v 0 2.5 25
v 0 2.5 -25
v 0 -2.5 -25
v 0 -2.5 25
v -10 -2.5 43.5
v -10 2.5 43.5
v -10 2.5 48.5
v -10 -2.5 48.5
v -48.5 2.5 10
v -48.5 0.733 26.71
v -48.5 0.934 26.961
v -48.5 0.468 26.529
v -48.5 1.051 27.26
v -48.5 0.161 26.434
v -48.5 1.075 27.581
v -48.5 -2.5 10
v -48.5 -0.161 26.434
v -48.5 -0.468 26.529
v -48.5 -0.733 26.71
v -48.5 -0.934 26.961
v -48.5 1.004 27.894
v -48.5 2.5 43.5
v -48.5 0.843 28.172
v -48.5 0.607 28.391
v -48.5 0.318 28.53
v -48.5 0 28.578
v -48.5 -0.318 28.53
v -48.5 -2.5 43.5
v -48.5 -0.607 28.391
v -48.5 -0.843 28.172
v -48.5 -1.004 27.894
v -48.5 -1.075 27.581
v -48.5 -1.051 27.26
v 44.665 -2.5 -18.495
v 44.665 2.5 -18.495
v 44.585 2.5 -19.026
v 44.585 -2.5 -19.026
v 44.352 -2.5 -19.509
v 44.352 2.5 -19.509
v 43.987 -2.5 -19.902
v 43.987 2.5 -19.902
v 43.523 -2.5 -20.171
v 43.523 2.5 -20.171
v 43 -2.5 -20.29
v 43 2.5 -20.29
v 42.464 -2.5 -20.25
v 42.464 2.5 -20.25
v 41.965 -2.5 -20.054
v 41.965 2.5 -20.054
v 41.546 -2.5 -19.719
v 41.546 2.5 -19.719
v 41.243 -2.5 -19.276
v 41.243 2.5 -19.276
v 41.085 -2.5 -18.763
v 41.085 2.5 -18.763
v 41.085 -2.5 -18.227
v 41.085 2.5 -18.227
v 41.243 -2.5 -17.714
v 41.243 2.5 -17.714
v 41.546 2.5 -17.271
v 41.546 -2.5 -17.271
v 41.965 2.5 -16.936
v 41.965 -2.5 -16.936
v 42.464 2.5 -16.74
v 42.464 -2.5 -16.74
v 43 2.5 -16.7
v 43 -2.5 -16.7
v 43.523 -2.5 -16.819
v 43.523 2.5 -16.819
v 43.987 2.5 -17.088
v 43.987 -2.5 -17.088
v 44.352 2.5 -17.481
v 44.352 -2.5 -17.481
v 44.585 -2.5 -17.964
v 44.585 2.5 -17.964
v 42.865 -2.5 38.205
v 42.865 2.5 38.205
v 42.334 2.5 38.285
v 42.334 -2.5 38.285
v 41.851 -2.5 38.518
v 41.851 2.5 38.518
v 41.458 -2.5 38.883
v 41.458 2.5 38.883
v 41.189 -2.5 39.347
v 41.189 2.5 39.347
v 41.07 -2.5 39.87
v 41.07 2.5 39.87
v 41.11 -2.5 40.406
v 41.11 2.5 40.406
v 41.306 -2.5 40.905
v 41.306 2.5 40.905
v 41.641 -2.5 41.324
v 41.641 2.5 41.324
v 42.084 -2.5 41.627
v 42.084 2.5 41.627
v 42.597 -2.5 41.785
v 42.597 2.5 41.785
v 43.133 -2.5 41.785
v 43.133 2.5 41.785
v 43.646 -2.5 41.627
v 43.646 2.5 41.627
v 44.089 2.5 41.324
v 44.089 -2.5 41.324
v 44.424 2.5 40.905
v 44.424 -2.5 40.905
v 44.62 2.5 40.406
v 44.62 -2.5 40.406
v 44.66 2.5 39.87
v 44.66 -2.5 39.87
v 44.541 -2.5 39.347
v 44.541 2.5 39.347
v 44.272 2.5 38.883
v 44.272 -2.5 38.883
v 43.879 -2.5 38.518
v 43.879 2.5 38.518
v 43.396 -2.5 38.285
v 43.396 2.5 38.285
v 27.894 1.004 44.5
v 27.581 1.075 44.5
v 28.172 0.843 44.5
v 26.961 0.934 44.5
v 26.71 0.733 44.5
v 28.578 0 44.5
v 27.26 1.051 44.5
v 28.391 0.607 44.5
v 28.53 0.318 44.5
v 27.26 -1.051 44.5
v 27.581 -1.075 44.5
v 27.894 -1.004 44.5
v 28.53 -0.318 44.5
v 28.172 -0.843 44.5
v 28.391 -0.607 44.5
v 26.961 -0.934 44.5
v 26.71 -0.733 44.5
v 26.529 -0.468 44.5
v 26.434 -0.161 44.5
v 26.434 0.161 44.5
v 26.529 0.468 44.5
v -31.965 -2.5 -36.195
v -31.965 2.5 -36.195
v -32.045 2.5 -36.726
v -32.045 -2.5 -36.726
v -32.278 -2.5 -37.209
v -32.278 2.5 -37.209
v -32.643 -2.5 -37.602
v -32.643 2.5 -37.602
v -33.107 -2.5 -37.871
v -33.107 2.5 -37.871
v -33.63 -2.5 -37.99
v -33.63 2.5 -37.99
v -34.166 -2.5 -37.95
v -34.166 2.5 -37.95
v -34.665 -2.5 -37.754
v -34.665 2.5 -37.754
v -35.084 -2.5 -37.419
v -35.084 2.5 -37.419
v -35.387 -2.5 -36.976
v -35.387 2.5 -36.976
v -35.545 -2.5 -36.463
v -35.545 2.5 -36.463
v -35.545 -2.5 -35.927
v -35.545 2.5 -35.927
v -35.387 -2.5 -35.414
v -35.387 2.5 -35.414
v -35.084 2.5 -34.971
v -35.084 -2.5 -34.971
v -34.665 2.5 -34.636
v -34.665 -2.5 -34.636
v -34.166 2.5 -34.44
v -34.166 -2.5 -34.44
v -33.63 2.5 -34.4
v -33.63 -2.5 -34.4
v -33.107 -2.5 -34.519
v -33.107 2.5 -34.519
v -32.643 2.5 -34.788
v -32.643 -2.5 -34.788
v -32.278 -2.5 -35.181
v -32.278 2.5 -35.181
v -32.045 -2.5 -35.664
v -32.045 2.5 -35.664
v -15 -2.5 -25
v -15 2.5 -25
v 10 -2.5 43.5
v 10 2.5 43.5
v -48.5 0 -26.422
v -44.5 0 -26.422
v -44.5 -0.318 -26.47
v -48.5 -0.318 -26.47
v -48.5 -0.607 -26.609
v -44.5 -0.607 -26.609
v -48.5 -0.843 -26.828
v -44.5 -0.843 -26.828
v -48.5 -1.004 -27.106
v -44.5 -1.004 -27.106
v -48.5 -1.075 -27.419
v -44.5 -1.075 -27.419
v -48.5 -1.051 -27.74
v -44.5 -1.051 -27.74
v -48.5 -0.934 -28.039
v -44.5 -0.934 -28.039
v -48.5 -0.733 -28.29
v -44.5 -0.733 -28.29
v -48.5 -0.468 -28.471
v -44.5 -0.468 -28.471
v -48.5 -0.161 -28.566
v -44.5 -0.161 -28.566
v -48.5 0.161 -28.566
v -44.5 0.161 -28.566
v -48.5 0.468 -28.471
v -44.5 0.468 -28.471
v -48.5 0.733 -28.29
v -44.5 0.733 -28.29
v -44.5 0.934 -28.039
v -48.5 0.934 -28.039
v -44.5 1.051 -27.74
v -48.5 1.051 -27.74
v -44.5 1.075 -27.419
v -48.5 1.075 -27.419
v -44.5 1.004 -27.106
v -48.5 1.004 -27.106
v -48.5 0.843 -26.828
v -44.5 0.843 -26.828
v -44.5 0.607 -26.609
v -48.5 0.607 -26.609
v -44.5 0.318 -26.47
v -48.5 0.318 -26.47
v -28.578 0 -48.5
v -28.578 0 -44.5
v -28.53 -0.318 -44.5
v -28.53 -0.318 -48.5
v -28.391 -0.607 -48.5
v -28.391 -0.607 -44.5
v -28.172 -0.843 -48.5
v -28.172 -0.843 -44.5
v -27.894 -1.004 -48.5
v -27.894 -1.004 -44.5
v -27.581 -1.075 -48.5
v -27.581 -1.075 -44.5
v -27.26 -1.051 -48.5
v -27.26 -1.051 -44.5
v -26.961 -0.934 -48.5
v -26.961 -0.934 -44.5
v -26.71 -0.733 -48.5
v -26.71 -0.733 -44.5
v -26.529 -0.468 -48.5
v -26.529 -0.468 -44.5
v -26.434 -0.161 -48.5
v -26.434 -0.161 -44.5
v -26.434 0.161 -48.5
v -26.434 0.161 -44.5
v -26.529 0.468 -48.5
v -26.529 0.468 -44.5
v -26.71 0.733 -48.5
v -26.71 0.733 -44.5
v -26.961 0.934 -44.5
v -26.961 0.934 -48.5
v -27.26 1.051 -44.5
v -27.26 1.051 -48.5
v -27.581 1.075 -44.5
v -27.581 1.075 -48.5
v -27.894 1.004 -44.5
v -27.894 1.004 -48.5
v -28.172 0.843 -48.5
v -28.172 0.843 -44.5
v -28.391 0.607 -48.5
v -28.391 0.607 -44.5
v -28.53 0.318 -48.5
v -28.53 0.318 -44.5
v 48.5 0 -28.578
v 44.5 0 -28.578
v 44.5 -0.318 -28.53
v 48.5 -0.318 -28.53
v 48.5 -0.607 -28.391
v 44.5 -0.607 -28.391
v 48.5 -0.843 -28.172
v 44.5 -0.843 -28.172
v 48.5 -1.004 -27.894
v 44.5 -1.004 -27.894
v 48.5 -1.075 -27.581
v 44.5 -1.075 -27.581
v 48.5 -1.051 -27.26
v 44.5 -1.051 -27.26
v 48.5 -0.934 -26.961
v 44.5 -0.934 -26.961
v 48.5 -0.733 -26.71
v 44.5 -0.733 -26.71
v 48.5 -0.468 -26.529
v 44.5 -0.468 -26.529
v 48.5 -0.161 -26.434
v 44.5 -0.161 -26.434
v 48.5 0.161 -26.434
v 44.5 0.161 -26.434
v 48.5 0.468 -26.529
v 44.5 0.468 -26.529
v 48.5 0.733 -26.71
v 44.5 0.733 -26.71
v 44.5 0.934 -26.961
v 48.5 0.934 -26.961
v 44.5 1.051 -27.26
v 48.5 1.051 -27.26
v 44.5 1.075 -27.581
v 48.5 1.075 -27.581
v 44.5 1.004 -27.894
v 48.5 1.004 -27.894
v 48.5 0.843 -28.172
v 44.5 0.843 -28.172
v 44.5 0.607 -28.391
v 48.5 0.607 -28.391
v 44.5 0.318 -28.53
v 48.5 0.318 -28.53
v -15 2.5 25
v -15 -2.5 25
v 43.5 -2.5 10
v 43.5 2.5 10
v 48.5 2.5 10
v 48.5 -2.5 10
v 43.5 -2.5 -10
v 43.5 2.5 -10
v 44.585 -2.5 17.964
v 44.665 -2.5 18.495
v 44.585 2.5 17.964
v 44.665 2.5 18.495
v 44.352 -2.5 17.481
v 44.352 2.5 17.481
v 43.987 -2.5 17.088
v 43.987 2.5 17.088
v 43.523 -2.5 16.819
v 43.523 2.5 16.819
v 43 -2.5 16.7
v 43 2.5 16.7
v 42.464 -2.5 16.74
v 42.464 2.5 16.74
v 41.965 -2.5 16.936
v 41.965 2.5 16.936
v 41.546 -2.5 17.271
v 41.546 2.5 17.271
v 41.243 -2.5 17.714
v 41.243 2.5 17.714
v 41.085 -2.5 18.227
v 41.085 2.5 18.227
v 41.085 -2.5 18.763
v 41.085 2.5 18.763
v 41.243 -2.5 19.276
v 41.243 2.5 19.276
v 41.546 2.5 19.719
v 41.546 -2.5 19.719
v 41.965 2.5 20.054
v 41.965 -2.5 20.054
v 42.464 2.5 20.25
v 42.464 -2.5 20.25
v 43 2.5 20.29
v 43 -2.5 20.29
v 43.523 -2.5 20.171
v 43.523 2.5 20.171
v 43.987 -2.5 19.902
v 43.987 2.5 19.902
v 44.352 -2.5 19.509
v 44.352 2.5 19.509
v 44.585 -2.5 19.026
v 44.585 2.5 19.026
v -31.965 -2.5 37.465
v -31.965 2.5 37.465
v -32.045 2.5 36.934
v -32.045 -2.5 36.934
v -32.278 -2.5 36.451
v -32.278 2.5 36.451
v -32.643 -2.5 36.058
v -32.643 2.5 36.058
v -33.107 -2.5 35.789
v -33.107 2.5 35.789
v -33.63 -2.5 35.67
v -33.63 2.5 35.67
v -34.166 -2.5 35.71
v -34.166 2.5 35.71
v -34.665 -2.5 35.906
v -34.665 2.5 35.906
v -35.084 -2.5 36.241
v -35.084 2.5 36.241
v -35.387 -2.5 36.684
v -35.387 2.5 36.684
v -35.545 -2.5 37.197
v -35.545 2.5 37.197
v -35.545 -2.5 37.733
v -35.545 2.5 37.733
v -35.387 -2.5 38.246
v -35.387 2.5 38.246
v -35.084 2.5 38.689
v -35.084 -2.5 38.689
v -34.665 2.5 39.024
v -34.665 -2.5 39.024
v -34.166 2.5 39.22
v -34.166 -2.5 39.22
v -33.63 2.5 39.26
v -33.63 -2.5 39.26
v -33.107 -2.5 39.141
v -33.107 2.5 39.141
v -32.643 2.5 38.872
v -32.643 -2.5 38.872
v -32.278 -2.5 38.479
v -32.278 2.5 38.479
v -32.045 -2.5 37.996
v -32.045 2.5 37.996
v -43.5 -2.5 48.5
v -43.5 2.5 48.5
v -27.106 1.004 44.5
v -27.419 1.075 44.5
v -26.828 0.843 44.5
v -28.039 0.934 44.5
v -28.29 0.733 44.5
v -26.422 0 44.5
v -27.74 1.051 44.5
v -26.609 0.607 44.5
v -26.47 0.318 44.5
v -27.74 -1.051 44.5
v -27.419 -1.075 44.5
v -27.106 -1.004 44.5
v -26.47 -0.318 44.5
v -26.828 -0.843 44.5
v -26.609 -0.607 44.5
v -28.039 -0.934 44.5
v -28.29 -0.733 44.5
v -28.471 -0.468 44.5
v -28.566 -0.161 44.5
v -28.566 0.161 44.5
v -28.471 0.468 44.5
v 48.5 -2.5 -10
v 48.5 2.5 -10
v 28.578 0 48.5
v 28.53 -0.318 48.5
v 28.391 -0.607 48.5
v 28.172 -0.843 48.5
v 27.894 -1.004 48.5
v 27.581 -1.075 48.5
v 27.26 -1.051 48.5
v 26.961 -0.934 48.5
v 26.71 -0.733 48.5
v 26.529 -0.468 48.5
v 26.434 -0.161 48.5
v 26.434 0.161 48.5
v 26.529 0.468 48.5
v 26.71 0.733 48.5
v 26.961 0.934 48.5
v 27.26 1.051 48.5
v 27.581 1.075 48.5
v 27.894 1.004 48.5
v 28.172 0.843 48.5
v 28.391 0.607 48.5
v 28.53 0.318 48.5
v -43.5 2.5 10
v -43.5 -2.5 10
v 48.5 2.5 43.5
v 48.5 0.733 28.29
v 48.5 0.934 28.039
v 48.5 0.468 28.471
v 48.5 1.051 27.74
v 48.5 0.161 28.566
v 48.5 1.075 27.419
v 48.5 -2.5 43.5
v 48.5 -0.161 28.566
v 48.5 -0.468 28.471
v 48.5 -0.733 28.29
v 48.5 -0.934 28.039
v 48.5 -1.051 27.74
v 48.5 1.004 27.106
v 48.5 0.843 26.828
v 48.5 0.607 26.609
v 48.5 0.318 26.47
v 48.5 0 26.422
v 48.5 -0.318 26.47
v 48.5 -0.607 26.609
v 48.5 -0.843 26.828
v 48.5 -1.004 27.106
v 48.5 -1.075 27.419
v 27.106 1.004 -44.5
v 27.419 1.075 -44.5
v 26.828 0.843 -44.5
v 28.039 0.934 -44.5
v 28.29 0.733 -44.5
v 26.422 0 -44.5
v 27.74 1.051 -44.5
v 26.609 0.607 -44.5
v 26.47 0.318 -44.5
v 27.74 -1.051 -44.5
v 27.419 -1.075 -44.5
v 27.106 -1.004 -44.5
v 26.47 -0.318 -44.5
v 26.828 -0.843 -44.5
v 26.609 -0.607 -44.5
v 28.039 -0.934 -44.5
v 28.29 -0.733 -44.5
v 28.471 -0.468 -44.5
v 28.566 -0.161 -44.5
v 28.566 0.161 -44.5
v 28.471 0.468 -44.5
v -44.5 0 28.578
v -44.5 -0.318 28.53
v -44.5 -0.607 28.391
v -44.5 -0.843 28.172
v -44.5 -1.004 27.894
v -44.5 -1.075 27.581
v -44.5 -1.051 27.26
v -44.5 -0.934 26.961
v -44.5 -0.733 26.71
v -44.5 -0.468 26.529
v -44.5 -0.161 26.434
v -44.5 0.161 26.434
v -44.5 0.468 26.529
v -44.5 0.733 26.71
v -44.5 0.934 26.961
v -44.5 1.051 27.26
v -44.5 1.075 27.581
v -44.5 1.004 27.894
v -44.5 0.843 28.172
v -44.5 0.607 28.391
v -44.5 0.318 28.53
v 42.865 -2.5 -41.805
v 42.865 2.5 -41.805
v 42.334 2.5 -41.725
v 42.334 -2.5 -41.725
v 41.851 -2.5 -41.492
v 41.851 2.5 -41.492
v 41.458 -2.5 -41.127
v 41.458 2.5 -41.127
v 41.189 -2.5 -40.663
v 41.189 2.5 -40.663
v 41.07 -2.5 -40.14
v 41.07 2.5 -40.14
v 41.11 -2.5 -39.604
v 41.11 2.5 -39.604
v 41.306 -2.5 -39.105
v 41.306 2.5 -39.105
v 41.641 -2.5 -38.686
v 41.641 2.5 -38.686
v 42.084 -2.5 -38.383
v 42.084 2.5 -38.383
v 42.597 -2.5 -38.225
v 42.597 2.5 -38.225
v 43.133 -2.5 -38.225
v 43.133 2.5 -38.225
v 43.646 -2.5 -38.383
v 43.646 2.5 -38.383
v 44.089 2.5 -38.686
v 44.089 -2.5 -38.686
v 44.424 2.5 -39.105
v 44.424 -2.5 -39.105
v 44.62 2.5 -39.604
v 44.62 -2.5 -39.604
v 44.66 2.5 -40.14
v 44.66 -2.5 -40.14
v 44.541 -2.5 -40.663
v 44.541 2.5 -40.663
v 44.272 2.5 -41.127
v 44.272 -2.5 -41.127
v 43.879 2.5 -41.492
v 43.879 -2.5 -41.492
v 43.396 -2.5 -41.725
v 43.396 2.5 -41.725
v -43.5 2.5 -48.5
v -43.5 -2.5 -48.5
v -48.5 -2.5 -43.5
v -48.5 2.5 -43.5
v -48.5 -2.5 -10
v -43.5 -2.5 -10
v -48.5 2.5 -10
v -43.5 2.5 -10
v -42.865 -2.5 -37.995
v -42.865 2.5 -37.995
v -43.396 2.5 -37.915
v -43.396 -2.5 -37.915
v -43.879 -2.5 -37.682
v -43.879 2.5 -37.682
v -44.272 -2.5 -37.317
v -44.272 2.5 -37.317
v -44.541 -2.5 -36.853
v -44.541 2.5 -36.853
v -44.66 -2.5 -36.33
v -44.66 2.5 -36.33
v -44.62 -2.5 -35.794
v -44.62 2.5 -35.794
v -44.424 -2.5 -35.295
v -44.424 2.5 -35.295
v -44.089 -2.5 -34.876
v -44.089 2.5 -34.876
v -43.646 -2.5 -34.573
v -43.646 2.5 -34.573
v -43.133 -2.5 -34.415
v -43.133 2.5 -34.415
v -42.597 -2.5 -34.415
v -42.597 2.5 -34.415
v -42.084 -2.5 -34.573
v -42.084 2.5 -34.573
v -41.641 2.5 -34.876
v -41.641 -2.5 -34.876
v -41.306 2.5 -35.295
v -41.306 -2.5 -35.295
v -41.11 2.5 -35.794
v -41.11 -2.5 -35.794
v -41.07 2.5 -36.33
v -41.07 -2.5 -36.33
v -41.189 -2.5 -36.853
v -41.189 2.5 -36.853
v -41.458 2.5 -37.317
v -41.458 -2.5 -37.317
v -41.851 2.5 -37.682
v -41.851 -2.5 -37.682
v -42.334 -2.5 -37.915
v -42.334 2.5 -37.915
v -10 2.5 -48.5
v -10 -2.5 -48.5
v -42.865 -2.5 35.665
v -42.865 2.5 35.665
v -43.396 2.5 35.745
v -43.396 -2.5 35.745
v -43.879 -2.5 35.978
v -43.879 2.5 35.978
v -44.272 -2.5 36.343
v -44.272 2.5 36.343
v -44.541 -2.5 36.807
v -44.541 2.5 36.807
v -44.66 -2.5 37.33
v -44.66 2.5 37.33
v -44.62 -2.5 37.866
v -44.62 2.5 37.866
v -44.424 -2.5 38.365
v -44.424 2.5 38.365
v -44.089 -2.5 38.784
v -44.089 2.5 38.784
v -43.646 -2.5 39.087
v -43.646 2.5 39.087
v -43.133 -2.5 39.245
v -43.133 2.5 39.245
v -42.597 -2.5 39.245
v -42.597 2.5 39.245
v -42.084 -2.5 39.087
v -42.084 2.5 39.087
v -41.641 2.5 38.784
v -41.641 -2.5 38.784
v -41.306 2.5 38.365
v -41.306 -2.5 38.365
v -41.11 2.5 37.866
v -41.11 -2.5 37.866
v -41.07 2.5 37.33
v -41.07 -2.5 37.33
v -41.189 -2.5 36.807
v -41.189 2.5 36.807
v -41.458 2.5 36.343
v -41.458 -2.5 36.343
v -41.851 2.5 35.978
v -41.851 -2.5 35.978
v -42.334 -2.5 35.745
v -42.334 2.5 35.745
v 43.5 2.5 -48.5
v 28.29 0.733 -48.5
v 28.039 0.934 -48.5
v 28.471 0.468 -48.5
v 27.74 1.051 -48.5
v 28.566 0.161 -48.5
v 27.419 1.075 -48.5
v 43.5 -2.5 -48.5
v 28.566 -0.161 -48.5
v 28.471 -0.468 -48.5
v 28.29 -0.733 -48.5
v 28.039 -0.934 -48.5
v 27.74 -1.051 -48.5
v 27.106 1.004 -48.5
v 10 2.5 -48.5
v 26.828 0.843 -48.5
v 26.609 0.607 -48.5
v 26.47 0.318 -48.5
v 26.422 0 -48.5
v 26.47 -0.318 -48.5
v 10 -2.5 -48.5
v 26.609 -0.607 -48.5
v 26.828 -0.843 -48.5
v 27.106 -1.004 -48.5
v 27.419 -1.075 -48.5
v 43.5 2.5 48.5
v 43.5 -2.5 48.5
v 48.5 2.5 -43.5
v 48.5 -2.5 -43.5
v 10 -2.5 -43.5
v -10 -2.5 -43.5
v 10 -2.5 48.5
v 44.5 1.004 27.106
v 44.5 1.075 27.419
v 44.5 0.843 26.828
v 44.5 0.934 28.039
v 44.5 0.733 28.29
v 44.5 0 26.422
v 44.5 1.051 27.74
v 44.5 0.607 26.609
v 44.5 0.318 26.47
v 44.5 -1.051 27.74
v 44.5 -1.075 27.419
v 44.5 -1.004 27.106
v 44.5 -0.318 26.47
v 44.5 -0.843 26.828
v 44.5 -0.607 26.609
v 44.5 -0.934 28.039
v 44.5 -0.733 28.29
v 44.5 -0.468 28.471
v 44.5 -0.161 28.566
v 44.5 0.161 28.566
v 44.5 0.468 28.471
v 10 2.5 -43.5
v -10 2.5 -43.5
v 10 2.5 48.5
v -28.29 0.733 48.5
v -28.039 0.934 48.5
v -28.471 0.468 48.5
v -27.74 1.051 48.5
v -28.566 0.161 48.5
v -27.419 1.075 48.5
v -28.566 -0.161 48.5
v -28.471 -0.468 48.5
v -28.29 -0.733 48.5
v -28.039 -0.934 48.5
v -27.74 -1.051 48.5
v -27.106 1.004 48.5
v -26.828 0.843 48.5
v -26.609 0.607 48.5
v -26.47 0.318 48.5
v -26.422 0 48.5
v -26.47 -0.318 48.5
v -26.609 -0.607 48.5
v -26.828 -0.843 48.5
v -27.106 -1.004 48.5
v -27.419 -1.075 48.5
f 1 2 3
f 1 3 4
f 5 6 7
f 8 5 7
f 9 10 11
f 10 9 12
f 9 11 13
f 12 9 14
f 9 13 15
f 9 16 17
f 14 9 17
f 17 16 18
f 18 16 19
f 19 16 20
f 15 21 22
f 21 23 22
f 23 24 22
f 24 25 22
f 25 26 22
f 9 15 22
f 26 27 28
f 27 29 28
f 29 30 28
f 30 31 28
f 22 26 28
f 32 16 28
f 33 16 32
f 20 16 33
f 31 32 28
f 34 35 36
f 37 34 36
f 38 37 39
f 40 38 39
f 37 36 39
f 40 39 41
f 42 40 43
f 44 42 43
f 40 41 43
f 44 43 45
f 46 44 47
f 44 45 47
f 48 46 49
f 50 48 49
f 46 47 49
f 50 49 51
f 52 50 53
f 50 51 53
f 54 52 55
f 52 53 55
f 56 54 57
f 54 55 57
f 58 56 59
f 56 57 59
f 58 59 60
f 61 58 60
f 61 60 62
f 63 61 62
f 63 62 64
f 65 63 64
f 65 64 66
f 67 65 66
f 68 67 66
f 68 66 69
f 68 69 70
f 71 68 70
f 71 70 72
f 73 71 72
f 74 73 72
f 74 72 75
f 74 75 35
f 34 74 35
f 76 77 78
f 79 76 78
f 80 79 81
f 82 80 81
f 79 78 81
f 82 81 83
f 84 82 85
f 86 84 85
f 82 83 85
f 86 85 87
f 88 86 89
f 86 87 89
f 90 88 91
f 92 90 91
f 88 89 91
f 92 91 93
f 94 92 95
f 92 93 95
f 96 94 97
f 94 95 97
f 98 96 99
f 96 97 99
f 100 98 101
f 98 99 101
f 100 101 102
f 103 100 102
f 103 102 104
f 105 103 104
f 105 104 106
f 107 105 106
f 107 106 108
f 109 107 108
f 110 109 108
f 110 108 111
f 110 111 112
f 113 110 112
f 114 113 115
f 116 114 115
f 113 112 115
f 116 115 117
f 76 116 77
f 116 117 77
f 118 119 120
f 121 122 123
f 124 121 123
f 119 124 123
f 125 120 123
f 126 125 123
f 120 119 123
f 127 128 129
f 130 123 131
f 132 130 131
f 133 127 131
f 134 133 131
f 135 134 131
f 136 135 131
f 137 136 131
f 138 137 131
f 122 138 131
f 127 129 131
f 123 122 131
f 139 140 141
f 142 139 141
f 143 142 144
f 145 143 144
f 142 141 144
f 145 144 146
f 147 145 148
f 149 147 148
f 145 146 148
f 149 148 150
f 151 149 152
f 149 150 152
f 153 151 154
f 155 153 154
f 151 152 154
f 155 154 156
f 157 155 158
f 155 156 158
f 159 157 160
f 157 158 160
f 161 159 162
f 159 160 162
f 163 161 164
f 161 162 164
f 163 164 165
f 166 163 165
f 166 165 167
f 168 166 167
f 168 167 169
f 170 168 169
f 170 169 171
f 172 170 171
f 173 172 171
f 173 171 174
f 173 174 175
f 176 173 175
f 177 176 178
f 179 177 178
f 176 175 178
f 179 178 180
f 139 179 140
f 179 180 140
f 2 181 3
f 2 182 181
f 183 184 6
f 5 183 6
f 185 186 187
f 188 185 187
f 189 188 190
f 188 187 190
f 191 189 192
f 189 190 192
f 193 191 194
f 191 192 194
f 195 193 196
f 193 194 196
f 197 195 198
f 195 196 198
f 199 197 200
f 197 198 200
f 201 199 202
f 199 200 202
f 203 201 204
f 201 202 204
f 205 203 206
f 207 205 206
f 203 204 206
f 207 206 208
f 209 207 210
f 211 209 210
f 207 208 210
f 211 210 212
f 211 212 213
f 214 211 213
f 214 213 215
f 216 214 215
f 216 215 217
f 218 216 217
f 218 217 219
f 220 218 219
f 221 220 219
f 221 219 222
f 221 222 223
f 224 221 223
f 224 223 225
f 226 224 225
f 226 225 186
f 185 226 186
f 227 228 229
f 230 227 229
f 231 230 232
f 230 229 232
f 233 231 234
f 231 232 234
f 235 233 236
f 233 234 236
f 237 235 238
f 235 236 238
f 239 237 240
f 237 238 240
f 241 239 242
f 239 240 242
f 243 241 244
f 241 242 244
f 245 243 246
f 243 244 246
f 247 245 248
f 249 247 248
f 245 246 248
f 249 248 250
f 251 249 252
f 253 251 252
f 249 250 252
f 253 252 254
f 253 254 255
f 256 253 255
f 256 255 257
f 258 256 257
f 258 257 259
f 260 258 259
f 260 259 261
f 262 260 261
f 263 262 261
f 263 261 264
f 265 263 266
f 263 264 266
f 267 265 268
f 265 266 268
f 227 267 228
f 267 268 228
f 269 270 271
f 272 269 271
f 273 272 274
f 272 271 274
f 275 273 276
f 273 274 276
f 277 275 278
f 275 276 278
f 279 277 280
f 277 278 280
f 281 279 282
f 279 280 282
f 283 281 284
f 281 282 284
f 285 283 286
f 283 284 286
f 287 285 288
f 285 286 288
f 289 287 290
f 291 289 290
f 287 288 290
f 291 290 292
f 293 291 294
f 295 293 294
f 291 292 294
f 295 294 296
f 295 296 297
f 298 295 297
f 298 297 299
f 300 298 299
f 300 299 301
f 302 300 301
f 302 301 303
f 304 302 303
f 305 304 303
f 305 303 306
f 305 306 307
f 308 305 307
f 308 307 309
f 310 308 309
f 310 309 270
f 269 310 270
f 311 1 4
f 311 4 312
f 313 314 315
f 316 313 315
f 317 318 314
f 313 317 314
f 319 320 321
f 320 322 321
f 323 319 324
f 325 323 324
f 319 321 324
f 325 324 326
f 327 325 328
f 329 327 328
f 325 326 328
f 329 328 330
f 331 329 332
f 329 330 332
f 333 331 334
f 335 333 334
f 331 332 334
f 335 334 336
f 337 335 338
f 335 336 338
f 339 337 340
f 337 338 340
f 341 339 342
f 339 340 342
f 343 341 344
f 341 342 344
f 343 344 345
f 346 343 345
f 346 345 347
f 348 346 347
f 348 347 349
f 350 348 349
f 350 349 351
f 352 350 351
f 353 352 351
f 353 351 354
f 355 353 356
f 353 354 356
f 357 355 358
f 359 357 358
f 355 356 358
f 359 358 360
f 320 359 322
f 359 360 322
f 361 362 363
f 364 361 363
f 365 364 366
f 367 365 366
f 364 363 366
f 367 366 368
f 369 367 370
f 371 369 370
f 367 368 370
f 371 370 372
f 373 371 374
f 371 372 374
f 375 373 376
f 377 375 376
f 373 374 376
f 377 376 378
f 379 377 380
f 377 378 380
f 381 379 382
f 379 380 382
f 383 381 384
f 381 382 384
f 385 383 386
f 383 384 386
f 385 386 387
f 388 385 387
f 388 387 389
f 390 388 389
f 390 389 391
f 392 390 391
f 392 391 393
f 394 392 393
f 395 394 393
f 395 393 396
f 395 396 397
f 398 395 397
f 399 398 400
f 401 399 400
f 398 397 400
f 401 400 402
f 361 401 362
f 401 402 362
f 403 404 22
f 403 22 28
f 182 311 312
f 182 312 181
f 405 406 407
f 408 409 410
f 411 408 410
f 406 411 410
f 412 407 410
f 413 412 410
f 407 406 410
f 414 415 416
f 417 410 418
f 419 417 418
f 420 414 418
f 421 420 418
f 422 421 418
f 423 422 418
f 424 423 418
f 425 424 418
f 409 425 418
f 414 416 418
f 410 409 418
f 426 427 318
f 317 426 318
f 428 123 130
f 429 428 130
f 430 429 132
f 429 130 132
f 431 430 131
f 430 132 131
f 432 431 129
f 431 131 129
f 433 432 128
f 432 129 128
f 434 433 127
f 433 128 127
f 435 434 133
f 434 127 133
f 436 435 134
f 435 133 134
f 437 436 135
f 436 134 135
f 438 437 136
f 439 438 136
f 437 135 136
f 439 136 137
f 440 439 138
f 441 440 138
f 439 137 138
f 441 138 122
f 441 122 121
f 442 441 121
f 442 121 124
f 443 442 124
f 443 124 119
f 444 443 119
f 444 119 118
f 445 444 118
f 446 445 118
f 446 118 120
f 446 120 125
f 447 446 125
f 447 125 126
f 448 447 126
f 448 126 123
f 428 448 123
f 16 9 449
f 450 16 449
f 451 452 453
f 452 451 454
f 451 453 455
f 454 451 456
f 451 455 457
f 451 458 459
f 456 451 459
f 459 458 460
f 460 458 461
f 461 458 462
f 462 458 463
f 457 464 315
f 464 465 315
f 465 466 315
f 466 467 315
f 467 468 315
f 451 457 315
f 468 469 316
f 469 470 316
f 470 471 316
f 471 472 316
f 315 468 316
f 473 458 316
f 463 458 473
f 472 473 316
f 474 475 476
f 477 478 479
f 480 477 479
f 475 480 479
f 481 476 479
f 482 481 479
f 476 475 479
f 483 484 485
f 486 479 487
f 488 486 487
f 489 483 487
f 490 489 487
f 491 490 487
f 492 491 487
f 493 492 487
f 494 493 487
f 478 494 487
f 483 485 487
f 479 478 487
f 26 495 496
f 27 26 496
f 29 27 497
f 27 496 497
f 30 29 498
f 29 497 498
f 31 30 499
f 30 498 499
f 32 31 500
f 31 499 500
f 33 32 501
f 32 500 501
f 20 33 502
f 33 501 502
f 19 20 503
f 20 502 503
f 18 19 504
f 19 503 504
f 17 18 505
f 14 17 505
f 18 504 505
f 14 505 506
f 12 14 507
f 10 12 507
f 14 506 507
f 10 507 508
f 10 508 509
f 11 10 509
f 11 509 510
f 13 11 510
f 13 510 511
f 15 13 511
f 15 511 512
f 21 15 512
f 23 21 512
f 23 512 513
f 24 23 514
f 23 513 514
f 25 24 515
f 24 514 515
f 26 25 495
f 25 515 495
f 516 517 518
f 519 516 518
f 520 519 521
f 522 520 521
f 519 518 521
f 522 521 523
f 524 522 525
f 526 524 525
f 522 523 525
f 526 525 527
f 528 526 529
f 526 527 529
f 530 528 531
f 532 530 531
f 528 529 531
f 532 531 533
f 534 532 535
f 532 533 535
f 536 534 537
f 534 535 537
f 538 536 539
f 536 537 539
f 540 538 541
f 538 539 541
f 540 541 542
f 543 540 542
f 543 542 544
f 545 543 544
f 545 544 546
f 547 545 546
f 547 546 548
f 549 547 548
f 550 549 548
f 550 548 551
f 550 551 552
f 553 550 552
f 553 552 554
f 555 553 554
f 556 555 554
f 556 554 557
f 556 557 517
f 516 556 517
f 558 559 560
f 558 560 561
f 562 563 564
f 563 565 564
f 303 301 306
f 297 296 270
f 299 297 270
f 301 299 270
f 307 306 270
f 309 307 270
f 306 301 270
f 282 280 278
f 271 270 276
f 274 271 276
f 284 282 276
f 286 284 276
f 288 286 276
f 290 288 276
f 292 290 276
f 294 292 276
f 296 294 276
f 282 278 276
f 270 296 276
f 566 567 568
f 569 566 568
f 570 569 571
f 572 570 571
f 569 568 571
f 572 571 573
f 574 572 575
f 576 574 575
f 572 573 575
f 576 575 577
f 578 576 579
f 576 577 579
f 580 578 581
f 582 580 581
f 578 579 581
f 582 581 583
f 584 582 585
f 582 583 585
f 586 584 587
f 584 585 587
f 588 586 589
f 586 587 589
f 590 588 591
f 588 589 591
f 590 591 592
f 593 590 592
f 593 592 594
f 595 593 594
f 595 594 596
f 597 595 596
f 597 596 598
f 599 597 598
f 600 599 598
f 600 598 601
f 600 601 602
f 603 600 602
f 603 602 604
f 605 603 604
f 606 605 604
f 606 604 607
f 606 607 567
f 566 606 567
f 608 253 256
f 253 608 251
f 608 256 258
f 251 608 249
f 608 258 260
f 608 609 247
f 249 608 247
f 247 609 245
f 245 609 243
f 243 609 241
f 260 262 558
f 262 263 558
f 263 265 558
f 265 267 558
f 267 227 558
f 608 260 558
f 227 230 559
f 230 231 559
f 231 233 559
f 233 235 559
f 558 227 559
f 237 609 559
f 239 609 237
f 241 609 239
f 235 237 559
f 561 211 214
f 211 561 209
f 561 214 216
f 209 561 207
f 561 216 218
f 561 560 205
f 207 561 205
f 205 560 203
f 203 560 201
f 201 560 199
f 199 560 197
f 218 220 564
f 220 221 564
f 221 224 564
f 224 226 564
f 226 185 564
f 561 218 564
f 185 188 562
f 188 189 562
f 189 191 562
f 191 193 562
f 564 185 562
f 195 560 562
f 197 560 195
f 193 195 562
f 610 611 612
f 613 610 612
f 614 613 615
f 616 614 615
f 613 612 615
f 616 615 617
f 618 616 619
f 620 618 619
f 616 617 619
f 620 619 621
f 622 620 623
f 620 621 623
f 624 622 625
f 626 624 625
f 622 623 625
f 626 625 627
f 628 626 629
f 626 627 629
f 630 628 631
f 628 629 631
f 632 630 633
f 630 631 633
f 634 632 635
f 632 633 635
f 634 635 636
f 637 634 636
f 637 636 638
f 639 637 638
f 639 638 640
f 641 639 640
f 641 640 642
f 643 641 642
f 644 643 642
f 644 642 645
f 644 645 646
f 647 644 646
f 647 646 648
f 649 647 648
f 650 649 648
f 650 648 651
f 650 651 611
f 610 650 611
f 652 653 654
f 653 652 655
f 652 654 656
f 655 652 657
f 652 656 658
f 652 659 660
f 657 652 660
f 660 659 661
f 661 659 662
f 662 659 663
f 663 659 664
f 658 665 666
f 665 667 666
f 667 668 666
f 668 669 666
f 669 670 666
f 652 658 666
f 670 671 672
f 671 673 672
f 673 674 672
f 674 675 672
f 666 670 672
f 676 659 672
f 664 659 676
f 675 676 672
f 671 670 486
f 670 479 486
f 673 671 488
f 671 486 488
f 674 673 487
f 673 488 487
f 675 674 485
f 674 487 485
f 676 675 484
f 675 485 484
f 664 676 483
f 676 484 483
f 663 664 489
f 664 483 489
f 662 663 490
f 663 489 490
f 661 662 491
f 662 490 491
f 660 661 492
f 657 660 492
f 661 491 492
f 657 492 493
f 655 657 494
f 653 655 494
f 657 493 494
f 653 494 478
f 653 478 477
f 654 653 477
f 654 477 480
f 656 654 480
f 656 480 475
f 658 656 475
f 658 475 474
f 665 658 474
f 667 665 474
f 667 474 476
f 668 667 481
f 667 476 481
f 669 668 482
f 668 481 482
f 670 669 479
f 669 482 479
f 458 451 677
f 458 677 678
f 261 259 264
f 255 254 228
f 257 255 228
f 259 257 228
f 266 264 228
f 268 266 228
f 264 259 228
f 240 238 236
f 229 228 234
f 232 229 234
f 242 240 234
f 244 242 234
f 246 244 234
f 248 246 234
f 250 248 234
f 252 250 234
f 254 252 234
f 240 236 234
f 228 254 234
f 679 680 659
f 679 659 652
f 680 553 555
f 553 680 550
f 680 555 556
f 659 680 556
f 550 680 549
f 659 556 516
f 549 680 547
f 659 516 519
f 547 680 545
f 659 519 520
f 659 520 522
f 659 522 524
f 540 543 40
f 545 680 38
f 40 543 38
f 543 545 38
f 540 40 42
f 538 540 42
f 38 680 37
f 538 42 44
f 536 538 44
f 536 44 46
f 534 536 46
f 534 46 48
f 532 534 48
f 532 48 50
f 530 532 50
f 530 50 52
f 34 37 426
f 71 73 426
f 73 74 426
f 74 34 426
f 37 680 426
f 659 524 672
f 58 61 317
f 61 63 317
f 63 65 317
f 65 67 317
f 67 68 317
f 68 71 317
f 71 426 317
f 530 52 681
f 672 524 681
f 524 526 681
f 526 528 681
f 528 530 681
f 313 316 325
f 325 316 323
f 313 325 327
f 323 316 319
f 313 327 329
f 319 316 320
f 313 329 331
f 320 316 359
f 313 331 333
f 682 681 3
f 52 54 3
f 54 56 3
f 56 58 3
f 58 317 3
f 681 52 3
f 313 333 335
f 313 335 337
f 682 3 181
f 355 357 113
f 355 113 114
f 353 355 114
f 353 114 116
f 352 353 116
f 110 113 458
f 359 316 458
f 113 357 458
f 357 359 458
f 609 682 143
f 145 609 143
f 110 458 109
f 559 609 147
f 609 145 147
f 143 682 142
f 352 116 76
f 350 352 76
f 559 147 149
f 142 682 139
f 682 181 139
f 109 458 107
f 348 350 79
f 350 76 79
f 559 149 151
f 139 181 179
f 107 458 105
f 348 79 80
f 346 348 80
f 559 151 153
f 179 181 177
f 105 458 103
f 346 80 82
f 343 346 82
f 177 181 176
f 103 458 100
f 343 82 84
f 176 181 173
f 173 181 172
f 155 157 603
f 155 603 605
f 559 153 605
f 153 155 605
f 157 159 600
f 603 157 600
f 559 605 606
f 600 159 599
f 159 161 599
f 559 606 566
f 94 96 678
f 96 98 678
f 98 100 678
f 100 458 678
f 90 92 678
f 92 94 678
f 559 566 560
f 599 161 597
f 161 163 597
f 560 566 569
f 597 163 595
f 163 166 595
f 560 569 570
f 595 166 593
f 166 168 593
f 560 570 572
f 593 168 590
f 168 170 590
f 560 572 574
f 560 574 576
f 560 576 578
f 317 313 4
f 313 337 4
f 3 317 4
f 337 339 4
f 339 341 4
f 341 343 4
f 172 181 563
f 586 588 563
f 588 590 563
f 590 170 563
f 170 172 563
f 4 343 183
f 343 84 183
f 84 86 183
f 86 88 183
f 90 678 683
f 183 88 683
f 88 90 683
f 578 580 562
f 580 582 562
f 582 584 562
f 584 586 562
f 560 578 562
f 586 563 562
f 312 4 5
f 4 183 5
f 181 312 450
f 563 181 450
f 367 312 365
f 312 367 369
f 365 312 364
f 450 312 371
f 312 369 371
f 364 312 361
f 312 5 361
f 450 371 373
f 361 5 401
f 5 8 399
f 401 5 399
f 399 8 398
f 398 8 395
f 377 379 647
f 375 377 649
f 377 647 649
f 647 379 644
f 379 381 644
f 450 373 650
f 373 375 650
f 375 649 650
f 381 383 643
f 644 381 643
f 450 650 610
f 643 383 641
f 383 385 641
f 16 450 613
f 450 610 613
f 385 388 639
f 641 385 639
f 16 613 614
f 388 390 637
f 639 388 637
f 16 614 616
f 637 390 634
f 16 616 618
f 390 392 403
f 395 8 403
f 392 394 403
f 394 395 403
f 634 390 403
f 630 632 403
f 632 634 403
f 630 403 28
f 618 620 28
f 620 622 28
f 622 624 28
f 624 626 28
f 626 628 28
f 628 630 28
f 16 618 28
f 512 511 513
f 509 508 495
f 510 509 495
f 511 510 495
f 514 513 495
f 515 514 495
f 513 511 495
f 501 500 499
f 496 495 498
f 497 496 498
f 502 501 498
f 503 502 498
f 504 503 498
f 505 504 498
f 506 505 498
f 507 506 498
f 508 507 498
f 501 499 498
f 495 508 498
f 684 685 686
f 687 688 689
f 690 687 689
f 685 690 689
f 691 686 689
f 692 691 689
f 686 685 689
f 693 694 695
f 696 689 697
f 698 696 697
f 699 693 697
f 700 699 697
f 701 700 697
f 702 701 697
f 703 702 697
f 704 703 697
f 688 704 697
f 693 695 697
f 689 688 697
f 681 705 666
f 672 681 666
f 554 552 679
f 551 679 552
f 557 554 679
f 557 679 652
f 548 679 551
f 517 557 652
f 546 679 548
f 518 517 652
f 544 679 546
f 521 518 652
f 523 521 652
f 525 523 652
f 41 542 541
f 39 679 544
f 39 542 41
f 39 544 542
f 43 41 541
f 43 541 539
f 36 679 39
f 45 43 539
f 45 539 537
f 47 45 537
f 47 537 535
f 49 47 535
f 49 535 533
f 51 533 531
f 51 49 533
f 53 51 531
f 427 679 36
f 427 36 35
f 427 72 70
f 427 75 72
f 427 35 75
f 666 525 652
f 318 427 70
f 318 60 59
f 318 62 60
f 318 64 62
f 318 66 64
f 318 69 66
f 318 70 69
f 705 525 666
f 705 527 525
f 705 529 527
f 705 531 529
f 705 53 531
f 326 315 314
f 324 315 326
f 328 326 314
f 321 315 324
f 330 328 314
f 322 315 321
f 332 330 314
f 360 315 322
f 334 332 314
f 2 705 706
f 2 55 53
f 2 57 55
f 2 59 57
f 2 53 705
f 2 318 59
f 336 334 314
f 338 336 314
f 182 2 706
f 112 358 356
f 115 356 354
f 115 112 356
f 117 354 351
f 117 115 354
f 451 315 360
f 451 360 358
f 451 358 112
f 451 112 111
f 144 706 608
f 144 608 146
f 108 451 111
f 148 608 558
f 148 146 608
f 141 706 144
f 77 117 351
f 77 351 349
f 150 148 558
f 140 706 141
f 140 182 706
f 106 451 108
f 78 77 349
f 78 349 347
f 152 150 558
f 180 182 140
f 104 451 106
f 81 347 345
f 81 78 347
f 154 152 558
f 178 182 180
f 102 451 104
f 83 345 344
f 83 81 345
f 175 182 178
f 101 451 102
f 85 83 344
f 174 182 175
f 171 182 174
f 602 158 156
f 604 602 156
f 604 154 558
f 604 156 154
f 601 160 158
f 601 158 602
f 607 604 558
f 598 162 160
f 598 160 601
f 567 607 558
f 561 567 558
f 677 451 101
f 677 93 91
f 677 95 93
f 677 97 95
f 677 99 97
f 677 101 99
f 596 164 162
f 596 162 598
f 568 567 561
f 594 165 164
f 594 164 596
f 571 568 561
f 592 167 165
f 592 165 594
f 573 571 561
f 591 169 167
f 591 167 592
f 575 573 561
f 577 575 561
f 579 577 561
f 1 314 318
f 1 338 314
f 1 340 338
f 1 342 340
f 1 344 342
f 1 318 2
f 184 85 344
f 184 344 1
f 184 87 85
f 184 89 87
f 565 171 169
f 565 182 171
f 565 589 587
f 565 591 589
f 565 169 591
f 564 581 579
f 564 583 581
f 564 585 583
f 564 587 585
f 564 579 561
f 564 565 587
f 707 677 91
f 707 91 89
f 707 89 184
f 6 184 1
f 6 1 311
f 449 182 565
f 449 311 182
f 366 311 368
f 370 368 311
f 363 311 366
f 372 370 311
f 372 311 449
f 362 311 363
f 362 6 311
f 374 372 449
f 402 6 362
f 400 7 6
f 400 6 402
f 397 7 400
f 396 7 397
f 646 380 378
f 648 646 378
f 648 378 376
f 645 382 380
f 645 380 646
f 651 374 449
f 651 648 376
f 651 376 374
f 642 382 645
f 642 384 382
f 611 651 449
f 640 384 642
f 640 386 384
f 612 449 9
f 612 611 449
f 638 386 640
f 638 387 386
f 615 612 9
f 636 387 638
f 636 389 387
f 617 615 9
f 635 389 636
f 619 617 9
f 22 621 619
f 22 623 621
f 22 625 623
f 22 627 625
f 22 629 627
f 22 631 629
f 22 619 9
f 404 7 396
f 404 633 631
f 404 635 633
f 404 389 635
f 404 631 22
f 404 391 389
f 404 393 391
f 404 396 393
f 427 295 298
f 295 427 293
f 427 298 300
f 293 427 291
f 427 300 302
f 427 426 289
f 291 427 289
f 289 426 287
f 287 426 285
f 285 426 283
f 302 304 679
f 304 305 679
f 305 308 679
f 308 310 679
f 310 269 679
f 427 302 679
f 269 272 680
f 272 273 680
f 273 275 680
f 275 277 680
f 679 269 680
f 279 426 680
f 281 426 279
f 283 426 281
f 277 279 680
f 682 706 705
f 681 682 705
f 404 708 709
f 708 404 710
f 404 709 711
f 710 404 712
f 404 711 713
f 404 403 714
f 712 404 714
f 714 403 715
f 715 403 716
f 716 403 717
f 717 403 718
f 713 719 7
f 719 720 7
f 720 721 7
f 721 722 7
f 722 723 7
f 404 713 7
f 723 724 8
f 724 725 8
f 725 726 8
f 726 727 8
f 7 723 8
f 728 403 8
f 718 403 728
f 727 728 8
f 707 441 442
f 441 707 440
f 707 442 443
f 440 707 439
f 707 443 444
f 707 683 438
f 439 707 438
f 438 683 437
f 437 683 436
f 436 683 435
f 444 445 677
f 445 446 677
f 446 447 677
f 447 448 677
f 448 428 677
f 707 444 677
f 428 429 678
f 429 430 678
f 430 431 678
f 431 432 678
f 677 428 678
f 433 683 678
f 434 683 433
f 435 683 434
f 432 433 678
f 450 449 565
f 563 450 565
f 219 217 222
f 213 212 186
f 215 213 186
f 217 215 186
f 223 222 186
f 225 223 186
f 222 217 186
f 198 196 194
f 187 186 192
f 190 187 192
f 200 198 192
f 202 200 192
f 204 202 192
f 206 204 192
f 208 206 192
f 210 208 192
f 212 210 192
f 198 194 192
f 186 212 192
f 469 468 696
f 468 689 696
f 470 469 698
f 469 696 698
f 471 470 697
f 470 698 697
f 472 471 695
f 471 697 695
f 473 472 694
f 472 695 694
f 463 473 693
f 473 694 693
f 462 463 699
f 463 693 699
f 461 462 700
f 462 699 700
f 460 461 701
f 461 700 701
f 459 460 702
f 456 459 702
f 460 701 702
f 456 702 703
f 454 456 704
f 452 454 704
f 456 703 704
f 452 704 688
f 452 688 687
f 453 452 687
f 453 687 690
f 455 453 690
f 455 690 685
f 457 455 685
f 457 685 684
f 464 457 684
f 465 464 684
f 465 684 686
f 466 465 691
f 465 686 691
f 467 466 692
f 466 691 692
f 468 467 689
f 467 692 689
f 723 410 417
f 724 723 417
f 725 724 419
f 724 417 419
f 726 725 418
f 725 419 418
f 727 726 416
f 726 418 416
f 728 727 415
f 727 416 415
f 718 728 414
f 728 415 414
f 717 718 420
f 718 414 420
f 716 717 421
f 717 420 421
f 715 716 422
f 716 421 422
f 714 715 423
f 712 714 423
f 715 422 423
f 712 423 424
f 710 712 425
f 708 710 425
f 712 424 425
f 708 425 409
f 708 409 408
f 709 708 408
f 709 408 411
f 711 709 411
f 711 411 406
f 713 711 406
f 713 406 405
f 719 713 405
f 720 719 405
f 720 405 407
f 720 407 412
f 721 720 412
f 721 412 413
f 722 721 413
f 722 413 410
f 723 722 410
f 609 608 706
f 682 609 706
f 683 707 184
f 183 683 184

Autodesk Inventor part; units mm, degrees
ref_plane "YZ Plane" through (0, 0, 0) normal (1, 0, 0) x (0, 1, 0)
ref_plane "XZ Plane" through (0, 0, 0) normal (0, 1, 0) x (-1, 0, 0)
ref_plane "XY Plane" through (0, 0, 0) normal (0, 0, 1) x (1, 0, 0)
sketch "Sketch1" plane through (0, 0, 0) normal (0, 1, 0) x (-1, 0, 0)
  line L0 (48.5, 48.5) -> (-48.5, 48.5)
  line L1 (-48.5, 48.5) -> (-48.5, -48.5)
  line L2 (-48.5, -48.5) -> (48.5, -48.5)
  line L3 (48.5, -48.5) -> (48.5, 48.5)
  point P0 (0, 0)
  point P1 (48.5, 0)
  point P2 (0, -48.5)
  dimension "d0" = 97
  dimension "d1" = 97
extrude "Extrusion1" add sketch "Sketch1" along normal mid plane 5
sketch "Sketch2" plane through (0, -2.5, 0) normal (0, -1, 0) x (1, 0, 0)
  line L0 (-42.865, 37.465) -> (-42.865, -36.195) construction
  line L1 (42.865, 40.005) -> (42.865, -40.005) construction
  line L2 (-42.865, 6.4948) -> (42.865, 6.4948) construction
  point P0 (0, 0)
  point P1 (42.865, 0)
  point P2 (0, 6.4948)
  dimension "d4" = 73.66
  dimension "d5" = 80.01
  dimension "d6" = 85.73
  dimension "d7" = 3.81
hole "Hole1" at (-42.865, -2.5, 37.465) at (42.865, -2.5, 40.005) at (-42.865, -2.5, -36.195) at (42.865, -2.5, -40.005) direction (0, 1, 0) diameter 3.6 end through all clearance for "Flat Head Machine Screw" size "M3" standard "Ansi Metric M Profile"
chamfer "Chamfer1" distance 5 angle 45 4 edges at (48.5, 0, -48.5) (-48.5, 0, -48.5) (48.5, 0, 48.5) (-48.5, 0, 48.5)
sketch "Sketch3" plane through (48.5, -2.5, 43.5) normal (1, 0, 0) x (0, 0, -1)
  point P0 (43.5, 2.5)
  point P1 (71, 2.5)
  point P2 (16, 2.5)
  dimension "d18" = 55
  dimension "d19" = 27.5
hole "Hole2" at (48.5, 0, -27.5) at (48.5, 0, 27.5) direction (-1, 0, 0) diameter 2.1565 depth 4 thread size "4-40 UNC" class "2B" standard "ANSI Unified Screw Threads"
pattern_circular "Circular Pattern1" count 4 over 360 about axis through (0, -10, 0) along (0, 1, 0) of "Hole2"
sketch "Sketch5" plane through (0, 2.5, 0) normal (0, 1, 0) x (1, 0, 0)
  line L0 (-15, 25) -> (0, 25)
  line L1 (0, 25) -> (0, -25)
  line L2 (0, -25) -> (-15, -25)
  line L3 (-15, -25) -> (-15, 25)
  point P0 (0, 0)
  point P1 (0, 0)
  dimension "d38" = 15
  dimension "d39" = 50
extrude "Extrusion3" cut sketch "Sketch5" against normal through all
sketch "Sketch6" plane through (0, 2.5, 0) normal (0, 1, 0) x (1, 0, 0)
  line L0 (-48.5, 43.5) -> (-48.5, -43.5) projected
  line L1 (-43.5, 10) -> (-48.5, 10)
  line L2 (-48.5, 10) -> (-48.5, -10)
  line L3 (-48.5, -10) -> (-43.5, -10)
  line L4 (-43.5, -10) -> (-43.5, 10)
  point P0 (0, 0)
  point P1 (-48.5, 0)
  dimension "d42" = 5
  dimension "d43" = 20
extrude "Extrusion4" cut sketch "Sketch6" against normal through all
pattern_circular "Circular Pattern3" count 4 over 360 about axis through (0, -10, 0) along (0, 1, 0) of "Extrusion4"
sketch "Sketch7" plane through (0, 2.5, 0) normal (0, 1, 0) x (1, 0, 0)
  circle A0 centre (-42.865, -37.465) radius 1.8 projected
  circle A1 centre (-42.865, 36.195) radius 1.8 projected
  circle A2 centre (42.865, 40.005) radius 1.8 projected
  circle A3 centre (42.865, -40.005) radius 1.8 projected
  circle A4 centre (42.865, -18.495) radius 1.8
  line L0 (43.5, -10) -> (43.5, 10) projected
  circle A5 centre (42.865, 18.495) radius 1.8
  line L1 (-48.5, -28.5782) -> (-48.5, -26.4218) projected
  circle A6 centre (-33.765, -37.465) radius 1.8
  circle A7 centre (-33.765, 36.195) radius 1.8
  point P0 (0, 0)
extrude "Extrusion5" cut sketch "Sketch7" against normal blind 5 contours A4 | A5 | A6 | A7
sketch "Sketch8" plane through (0, 2.5, 0) normal (0, 1, 0) x (1, 0, 0)
  point P0 (0, 0)
equation "\"d1\" = d0"
equation "\"d19\" = 0.5 * d18"
properties part number "stackframesupportbottom" material "Aluminum 6061"
